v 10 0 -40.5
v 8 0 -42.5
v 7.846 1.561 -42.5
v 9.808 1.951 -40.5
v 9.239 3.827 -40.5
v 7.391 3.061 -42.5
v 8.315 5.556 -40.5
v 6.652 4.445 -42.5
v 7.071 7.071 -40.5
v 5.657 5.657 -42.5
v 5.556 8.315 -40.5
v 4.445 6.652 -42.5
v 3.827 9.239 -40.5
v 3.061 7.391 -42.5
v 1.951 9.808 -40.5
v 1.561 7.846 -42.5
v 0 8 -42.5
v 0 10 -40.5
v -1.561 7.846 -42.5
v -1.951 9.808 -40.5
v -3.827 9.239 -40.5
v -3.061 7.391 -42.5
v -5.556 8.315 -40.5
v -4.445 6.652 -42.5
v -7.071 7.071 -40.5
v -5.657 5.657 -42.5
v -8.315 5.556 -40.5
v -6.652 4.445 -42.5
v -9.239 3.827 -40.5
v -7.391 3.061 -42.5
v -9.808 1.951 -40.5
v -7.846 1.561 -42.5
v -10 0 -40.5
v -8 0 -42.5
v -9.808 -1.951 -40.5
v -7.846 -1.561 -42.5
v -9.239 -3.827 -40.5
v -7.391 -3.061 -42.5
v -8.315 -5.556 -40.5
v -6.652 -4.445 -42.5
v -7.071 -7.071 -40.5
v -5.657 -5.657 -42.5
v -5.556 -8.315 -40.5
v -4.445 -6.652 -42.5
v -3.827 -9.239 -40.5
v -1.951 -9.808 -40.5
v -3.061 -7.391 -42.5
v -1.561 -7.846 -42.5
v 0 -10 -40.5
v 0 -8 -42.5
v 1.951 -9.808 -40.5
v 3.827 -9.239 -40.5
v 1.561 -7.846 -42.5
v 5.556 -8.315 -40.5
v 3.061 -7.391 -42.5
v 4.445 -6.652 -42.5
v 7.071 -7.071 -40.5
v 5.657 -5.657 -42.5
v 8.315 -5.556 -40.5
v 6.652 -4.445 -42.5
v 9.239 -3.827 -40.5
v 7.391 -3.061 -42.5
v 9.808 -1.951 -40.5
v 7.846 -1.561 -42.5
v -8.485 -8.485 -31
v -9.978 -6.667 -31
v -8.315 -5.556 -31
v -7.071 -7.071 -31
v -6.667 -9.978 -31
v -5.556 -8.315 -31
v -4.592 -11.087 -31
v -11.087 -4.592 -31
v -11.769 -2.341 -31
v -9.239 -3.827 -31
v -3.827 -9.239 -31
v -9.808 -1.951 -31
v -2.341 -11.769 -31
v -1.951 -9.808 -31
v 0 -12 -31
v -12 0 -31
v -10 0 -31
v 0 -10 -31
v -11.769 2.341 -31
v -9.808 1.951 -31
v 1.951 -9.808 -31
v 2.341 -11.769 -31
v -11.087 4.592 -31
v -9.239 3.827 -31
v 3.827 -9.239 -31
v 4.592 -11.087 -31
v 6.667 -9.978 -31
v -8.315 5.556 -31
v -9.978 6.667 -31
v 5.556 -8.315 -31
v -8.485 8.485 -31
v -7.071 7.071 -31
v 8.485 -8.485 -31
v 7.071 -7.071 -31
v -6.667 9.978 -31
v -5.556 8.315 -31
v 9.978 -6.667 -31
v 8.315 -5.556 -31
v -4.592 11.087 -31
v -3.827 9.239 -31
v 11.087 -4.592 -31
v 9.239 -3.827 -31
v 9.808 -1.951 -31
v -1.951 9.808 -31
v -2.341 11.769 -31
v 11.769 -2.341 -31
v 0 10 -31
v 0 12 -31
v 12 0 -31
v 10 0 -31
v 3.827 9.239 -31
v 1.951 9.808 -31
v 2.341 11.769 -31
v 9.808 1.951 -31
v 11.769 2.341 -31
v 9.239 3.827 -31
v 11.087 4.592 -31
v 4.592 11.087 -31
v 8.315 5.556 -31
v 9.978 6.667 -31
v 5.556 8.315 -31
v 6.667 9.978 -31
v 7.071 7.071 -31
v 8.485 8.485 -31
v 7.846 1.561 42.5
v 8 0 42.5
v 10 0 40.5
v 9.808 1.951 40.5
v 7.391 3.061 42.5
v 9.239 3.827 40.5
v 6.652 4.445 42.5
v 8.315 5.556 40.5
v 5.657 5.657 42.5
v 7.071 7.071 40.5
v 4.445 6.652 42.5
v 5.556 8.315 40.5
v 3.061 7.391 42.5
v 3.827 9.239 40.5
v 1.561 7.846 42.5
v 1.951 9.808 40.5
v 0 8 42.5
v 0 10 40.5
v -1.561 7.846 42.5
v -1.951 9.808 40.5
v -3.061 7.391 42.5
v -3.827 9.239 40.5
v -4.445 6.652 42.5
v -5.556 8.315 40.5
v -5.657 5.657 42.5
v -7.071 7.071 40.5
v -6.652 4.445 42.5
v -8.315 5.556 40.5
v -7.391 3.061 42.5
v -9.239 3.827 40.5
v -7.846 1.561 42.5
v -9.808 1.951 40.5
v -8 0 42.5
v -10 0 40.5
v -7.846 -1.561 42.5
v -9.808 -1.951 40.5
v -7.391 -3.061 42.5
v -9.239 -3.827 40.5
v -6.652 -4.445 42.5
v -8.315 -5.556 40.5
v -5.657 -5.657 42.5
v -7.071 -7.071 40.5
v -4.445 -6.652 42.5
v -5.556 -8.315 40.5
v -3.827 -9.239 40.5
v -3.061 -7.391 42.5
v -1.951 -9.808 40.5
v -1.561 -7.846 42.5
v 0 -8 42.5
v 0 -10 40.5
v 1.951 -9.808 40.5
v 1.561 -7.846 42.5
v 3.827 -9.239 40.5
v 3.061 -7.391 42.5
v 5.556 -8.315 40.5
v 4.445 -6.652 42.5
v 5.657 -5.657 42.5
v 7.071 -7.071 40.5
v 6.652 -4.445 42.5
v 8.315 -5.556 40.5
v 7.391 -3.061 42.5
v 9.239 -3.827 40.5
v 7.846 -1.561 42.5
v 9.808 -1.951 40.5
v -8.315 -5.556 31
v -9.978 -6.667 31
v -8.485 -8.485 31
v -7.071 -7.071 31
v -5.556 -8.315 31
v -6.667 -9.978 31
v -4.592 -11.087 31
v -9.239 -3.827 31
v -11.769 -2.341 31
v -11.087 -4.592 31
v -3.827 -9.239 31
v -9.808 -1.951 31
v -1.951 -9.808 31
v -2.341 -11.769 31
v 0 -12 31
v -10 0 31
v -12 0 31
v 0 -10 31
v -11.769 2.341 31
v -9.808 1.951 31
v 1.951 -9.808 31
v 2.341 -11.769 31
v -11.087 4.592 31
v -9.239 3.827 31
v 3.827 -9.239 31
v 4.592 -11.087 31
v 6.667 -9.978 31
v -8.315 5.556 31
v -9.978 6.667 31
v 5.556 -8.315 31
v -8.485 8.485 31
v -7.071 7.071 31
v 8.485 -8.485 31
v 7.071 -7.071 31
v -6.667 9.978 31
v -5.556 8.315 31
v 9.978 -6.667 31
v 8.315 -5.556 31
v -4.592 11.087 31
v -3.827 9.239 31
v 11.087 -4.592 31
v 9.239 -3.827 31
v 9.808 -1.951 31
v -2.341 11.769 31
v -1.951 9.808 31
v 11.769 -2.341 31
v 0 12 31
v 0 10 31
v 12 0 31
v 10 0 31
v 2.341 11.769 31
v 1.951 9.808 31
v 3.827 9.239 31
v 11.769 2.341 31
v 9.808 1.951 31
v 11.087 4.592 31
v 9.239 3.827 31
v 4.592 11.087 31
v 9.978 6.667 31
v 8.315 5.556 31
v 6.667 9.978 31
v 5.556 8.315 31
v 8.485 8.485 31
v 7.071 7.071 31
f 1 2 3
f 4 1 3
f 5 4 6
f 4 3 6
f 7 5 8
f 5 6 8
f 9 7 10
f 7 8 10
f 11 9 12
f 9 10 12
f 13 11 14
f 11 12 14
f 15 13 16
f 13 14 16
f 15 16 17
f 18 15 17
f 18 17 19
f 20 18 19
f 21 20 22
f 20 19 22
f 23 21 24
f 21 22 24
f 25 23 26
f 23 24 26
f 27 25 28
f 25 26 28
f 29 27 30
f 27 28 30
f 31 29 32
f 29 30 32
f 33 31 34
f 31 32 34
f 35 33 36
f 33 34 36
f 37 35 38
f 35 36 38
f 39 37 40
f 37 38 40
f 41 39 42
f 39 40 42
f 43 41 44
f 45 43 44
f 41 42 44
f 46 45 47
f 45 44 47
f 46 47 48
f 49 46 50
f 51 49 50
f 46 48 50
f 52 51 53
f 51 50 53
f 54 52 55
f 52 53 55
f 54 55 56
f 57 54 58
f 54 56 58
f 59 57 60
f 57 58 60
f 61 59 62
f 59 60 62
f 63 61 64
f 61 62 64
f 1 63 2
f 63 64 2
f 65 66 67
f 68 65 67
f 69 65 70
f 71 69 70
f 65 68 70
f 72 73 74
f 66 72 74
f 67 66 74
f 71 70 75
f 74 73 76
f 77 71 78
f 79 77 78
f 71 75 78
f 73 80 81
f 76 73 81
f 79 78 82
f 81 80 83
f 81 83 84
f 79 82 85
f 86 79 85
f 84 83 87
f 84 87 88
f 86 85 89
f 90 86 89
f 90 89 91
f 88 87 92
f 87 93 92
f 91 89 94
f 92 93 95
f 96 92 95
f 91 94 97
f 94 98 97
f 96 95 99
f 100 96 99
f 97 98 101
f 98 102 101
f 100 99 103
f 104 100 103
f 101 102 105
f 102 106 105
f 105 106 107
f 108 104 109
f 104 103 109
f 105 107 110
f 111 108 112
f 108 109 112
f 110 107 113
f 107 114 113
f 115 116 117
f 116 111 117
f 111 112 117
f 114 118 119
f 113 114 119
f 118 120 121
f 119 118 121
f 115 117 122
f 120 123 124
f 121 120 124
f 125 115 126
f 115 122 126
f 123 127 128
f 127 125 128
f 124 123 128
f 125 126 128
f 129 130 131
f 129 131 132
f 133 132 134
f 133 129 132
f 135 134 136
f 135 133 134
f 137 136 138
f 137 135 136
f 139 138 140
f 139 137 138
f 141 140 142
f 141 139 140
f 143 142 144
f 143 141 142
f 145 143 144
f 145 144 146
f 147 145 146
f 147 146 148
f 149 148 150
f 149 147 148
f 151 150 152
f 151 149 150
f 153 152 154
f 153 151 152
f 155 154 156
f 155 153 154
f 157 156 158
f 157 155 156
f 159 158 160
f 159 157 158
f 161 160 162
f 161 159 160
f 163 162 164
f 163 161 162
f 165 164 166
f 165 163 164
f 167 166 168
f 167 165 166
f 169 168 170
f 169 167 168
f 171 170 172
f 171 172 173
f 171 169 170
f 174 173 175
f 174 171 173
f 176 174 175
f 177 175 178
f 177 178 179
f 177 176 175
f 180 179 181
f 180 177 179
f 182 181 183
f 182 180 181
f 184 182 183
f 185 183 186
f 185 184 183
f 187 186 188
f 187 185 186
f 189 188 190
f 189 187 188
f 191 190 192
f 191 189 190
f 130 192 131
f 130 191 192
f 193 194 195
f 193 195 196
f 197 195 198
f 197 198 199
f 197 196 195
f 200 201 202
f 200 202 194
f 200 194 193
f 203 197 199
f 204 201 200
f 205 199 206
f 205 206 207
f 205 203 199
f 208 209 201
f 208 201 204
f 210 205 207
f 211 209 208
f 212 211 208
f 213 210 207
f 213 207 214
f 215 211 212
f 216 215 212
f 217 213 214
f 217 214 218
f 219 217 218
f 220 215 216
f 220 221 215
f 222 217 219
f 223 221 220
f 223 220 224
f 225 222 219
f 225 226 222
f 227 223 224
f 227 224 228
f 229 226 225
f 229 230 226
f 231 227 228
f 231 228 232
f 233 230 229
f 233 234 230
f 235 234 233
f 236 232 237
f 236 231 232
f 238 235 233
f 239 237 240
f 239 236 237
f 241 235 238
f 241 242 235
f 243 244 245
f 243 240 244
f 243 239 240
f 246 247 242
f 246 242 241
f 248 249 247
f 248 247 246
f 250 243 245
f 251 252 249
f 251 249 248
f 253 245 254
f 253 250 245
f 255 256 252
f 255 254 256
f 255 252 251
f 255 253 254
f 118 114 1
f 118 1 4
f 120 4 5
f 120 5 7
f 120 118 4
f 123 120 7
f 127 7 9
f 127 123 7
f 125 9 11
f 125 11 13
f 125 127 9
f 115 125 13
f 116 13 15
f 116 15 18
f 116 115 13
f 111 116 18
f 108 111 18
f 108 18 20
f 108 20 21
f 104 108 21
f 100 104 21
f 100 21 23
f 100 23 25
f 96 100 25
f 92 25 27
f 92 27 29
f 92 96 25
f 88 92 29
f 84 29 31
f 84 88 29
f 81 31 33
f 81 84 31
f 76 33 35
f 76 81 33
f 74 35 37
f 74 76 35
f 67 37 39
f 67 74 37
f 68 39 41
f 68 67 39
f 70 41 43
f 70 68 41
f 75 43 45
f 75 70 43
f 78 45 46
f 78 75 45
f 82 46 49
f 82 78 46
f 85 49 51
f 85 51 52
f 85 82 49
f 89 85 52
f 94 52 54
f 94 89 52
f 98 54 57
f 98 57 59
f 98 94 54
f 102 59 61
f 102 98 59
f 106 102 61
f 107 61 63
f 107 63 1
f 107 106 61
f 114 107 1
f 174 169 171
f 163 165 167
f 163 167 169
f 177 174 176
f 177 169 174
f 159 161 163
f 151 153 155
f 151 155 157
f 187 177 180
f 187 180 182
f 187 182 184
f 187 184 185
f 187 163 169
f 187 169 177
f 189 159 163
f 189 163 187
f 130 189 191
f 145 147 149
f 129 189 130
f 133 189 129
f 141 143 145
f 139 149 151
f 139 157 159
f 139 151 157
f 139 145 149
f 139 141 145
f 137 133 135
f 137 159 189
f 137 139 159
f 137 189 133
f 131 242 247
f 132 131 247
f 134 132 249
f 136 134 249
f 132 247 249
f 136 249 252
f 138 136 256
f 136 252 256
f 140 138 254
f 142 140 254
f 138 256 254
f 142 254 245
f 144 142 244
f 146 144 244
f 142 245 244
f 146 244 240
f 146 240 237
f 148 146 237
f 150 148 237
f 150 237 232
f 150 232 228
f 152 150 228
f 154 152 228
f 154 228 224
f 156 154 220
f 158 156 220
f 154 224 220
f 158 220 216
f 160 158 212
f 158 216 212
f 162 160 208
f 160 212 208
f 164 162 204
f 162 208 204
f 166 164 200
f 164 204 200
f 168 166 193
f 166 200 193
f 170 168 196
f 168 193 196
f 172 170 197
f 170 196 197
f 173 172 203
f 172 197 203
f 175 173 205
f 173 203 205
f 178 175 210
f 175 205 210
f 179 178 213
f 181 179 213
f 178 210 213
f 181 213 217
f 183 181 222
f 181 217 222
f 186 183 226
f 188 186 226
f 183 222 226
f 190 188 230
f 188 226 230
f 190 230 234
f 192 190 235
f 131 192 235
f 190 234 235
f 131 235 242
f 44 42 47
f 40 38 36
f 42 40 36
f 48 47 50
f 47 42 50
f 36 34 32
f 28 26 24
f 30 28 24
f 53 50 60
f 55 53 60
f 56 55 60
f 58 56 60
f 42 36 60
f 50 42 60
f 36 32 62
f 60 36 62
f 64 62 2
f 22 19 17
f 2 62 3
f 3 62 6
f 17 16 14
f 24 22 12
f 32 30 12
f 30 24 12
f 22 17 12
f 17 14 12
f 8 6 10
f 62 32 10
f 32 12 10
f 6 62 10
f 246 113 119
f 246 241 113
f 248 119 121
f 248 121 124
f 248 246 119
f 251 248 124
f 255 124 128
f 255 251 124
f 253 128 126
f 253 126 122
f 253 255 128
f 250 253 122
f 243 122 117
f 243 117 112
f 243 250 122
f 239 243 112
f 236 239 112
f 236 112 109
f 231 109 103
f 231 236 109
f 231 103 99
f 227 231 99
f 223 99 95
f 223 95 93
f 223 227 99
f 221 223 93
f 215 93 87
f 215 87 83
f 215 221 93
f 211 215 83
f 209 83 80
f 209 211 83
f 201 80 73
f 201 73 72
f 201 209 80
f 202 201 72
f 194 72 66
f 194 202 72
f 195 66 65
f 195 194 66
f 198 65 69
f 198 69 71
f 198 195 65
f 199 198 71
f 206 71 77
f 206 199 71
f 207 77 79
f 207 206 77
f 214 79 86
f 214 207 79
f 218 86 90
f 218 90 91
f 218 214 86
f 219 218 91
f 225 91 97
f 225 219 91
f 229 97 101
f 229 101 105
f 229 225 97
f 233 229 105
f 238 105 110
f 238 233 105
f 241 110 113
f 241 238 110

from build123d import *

# Parameters (mm, degrees)
F0_R     = 12
F1_DEPTH = 31
F2_R     = 10
F3_DEPTH = 11.5
F4_SIZE  = 2


# Not quite as in the source:
# - a pattern or mirror of a feature is missing from the dataset's text; its kind, count and spacing are read off the source's solid


with BuildPart() as f1:
    # F0 (on Top) → F1 (new body, symmetric)
    with BuildSketch(Plane.XY):
        Circle(F0_R)
    extrude(amount=F1_DEPTH, both=True)

    # F2 (on face) → F3 (join)
    with BuildSketch(Plane.XY.offset(31)):
        Circle(F2_R)
    f3 = extrude(amount=F3_DEPTH)

    # F3_copies: F3 across plane
    add(f3.mirror(Plane(origin=(0, 0, 0), x_dir=(-1, 0, 0), z_dir=(0, 0, -1))))

    # F4
    f4_edges = [f1.edges().sort_by_distance(p)[0] for p in [
        (-10, 0, 42.5),
        (-10, 0, -42.5),
    ]]
    chamfer(f4_edges, length=F4_SIZE)


solid = f1.part
